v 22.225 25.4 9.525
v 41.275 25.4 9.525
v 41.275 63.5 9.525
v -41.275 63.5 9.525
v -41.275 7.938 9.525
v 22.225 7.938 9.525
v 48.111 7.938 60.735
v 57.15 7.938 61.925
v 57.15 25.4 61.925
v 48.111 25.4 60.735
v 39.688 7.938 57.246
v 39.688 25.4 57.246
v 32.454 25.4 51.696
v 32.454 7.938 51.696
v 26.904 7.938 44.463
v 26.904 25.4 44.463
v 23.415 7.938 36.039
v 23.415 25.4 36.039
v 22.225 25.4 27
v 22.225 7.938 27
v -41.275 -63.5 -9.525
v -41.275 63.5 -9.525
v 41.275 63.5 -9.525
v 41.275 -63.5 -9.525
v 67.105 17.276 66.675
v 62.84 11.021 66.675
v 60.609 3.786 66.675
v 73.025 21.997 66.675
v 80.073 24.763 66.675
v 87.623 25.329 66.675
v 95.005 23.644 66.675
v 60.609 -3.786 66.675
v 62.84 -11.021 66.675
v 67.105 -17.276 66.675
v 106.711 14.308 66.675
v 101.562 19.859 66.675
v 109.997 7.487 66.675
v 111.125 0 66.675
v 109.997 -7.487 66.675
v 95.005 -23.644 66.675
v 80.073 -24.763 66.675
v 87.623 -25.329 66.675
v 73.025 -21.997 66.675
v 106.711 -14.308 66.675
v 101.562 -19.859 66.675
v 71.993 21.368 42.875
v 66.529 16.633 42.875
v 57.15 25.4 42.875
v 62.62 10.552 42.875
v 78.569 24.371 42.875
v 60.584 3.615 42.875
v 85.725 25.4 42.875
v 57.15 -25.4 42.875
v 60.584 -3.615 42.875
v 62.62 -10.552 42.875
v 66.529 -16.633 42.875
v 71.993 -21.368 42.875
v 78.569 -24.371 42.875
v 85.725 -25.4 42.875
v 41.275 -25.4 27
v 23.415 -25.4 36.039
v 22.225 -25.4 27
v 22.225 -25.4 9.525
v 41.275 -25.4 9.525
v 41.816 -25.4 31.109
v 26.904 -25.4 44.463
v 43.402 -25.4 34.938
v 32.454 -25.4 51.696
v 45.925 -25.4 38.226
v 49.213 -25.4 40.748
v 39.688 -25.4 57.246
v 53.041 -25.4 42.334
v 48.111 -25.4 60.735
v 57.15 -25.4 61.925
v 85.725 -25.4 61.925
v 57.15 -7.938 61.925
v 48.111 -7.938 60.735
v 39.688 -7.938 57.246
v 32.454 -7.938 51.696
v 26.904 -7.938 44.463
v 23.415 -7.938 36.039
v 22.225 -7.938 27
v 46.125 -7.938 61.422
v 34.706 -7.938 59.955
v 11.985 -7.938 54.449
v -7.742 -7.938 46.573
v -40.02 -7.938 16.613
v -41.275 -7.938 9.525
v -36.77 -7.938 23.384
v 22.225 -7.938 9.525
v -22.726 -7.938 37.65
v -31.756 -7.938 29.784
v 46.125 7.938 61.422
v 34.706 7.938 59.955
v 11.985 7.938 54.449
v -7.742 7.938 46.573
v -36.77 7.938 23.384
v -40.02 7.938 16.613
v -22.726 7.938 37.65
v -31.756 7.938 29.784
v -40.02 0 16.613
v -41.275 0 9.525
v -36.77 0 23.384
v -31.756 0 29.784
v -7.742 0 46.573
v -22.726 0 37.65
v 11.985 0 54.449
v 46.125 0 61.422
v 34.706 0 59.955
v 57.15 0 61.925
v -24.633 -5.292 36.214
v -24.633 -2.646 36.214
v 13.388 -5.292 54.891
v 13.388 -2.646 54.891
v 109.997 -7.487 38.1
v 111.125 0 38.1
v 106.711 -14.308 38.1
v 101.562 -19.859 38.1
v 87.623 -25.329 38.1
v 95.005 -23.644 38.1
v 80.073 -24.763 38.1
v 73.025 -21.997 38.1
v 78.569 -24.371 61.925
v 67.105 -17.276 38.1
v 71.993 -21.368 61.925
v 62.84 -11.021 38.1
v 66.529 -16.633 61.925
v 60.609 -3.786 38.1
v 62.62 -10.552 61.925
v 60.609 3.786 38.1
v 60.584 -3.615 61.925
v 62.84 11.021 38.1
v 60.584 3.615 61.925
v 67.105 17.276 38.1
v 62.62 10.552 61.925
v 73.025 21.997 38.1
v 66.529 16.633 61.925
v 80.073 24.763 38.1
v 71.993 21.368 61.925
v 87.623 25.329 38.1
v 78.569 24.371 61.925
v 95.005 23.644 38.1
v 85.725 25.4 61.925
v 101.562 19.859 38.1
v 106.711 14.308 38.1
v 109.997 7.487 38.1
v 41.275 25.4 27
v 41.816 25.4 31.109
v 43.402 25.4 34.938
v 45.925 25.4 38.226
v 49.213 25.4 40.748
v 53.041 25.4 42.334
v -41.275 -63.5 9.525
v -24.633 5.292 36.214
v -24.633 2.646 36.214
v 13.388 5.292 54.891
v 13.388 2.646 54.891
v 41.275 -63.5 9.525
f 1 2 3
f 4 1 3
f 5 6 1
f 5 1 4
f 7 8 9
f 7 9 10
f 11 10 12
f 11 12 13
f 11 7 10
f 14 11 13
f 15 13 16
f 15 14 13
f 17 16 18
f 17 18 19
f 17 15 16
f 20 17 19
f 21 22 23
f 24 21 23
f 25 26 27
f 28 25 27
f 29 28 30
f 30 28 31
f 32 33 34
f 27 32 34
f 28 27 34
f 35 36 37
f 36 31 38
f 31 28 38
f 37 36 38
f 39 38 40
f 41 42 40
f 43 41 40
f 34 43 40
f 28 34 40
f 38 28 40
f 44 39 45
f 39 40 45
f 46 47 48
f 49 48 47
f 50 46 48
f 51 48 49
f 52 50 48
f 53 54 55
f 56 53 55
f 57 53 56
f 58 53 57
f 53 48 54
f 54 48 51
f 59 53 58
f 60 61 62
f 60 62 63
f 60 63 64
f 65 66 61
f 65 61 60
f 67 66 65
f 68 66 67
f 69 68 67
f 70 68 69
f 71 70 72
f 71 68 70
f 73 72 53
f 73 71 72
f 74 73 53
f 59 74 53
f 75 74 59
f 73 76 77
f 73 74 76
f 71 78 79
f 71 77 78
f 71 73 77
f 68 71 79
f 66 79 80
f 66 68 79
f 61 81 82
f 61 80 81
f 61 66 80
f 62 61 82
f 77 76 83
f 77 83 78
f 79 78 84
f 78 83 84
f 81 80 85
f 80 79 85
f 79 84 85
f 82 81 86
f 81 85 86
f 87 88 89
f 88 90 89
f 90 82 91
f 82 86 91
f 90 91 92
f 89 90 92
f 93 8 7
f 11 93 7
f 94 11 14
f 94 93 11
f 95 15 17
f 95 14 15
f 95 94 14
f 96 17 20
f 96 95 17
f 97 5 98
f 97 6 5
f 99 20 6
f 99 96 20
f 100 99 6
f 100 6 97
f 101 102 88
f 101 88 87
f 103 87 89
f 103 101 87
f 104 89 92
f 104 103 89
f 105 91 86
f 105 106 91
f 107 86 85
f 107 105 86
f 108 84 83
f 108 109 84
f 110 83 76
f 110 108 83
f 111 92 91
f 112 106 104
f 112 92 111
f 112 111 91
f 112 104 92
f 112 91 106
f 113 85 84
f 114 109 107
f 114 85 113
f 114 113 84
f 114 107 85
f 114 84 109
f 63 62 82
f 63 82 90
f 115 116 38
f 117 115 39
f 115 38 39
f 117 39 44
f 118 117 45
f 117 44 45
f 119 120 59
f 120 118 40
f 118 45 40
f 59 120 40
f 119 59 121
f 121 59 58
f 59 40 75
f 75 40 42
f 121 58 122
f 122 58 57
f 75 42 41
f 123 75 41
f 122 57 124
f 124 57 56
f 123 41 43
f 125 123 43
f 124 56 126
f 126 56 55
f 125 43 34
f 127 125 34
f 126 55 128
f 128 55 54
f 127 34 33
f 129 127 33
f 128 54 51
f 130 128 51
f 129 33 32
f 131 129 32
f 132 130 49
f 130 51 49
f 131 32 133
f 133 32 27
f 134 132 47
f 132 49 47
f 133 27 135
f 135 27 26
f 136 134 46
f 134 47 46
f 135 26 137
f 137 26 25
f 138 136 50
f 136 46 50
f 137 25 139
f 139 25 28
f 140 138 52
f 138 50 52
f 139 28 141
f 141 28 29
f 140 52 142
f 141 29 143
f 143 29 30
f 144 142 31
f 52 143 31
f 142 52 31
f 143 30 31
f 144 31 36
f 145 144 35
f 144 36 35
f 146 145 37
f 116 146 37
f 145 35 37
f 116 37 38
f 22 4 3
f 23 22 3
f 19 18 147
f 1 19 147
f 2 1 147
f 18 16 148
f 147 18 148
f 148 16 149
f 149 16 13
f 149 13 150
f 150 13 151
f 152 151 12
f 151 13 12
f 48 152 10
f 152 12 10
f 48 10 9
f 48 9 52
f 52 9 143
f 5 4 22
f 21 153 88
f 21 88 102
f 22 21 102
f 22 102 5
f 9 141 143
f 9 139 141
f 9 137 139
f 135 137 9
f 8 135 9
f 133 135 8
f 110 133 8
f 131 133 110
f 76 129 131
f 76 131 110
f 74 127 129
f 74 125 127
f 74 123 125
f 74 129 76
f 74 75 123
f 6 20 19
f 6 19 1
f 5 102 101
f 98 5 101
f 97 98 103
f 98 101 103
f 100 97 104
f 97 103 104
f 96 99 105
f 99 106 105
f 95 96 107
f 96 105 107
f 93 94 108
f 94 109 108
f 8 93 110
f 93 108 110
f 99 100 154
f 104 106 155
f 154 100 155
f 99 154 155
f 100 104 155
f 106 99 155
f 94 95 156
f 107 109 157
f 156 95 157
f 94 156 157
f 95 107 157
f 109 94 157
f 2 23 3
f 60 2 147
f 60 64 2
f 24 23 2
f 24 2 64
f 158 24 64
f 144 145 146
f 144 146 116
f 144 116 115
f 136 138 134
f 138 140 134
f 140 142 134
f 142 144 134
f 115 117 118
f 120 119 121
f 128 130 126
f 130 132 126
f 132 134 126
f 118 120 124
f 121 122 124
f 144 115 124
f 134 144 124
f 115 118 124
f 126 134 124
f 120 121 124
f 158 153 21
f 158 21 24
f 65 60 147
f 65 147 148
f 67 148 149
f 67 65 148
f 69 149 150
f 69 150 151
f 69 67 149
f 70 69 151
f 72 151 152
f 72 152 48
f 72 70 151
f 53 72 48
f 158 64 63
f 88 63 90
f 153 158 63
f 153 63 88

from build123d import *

# Parameters (mm, degrees)
F1_DEPTH = 63.5
F0_W     = 25.4
F0_H     = 19.05
F2_DEPTH = 25.4
F3_DEPTH = 7.9375


with BuildPart() as f1:
    # F0 (on Front) → F1 (new body, symmetric)
    with BuildSketch(Plane.XZ):
        Polygon((-41.275, 9.525), (-41.275, -9.525), (41.275, -9.525), (41.275, 9.525), (22.225, 9.525), align=None)
    extrude(amount=F1_DEPTH, both=True)

    # F0 (on Front) → F2 (join, symmetric)
    with BuildSketch(Plane.XZ):
        with BuildLine():
            Line((60.325, 61.9252), (57.15, 61.9252))
            ThreePointArc((57.15, 61.9252), (32.4542956671, 51.6959043329), (22.225, 27.0002))
            Line((22.225, 27.0002), (22.225, 9.525))
            Line((22.225, 9.525), (41.275, 9.525))
            Line((41.275, 9.525), (41.275, 27.0002))
            ThreePointArc((41.275, 27.0002), (45.9246798487, 38.2255201513), (57.15, 42.8752))
            Line((57.15, 42.8752), (60.325, 42.8752))
            Line((60.325, 42.8752), (60.325, 61.9252))
        make_face()
        with Locations((73.025, 52.4002)):
            Rectangle(F0_W, F0_H)
    extrude(amount=F2_DEPTH, both=True)

    # F0 (on Front) → F3 (join, symmetric)
    with BuildSketch(Plane.XZ):
        with BuildLine():
            add(Edge.make_bspline(
                [(-41.275, 9.525), (-40.5363477767, 39.0089415014), (15.7318022102, 61.9221478701), (57.15, 61.9252)],
                knots=[0, 0, 0, 0, 111.5045361635, 111.5045361635, 111.5045361635, 111.5045361635], degree=3))
            Line((-41.275, 9.525), (22.225, 9.525))
            Line((22.225, 9.525), (22.225, 27.0002))
            ThreePointArc((22.225, 27.0002), (32.4542956671, 51.6959043329), (57.15, 61.9252))
        make_face()
    extrude(amount=F3_DEPTH, both=True)

    # F0 (on Front) → F4 (revolve)
    with BuildSketch(Plane.XZ):
        Polygon((85.725, 66.675), (85.725, 61.9252), (85.725, 42.8752), (85.725, 38.1), (111.125, 38.1), (111.125, 66.675), align=None)
    revolve(axis=Axis((85.725, 0, 52.3875), (0, 0, -1)))


solid = f1.part
